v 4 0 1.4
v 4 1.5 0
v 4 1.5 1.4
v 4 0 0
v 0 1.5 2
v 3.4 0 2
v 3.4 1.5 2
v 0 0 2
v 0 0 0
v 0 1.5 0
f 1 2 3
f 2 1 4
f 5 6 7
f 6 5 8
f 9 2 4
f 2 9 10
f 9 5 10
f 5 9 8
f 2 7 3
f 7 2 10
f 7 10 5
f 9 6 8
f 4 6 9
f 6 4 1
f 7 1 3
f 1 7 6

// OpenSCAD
difference () {
  color([.9, .9, .9]) cube([4, 1.5, 2]);
  translate([4, 0, 2 - 0.6]) rotate([0, -45, 0]) cube([1, 1.5, 1]);
}
